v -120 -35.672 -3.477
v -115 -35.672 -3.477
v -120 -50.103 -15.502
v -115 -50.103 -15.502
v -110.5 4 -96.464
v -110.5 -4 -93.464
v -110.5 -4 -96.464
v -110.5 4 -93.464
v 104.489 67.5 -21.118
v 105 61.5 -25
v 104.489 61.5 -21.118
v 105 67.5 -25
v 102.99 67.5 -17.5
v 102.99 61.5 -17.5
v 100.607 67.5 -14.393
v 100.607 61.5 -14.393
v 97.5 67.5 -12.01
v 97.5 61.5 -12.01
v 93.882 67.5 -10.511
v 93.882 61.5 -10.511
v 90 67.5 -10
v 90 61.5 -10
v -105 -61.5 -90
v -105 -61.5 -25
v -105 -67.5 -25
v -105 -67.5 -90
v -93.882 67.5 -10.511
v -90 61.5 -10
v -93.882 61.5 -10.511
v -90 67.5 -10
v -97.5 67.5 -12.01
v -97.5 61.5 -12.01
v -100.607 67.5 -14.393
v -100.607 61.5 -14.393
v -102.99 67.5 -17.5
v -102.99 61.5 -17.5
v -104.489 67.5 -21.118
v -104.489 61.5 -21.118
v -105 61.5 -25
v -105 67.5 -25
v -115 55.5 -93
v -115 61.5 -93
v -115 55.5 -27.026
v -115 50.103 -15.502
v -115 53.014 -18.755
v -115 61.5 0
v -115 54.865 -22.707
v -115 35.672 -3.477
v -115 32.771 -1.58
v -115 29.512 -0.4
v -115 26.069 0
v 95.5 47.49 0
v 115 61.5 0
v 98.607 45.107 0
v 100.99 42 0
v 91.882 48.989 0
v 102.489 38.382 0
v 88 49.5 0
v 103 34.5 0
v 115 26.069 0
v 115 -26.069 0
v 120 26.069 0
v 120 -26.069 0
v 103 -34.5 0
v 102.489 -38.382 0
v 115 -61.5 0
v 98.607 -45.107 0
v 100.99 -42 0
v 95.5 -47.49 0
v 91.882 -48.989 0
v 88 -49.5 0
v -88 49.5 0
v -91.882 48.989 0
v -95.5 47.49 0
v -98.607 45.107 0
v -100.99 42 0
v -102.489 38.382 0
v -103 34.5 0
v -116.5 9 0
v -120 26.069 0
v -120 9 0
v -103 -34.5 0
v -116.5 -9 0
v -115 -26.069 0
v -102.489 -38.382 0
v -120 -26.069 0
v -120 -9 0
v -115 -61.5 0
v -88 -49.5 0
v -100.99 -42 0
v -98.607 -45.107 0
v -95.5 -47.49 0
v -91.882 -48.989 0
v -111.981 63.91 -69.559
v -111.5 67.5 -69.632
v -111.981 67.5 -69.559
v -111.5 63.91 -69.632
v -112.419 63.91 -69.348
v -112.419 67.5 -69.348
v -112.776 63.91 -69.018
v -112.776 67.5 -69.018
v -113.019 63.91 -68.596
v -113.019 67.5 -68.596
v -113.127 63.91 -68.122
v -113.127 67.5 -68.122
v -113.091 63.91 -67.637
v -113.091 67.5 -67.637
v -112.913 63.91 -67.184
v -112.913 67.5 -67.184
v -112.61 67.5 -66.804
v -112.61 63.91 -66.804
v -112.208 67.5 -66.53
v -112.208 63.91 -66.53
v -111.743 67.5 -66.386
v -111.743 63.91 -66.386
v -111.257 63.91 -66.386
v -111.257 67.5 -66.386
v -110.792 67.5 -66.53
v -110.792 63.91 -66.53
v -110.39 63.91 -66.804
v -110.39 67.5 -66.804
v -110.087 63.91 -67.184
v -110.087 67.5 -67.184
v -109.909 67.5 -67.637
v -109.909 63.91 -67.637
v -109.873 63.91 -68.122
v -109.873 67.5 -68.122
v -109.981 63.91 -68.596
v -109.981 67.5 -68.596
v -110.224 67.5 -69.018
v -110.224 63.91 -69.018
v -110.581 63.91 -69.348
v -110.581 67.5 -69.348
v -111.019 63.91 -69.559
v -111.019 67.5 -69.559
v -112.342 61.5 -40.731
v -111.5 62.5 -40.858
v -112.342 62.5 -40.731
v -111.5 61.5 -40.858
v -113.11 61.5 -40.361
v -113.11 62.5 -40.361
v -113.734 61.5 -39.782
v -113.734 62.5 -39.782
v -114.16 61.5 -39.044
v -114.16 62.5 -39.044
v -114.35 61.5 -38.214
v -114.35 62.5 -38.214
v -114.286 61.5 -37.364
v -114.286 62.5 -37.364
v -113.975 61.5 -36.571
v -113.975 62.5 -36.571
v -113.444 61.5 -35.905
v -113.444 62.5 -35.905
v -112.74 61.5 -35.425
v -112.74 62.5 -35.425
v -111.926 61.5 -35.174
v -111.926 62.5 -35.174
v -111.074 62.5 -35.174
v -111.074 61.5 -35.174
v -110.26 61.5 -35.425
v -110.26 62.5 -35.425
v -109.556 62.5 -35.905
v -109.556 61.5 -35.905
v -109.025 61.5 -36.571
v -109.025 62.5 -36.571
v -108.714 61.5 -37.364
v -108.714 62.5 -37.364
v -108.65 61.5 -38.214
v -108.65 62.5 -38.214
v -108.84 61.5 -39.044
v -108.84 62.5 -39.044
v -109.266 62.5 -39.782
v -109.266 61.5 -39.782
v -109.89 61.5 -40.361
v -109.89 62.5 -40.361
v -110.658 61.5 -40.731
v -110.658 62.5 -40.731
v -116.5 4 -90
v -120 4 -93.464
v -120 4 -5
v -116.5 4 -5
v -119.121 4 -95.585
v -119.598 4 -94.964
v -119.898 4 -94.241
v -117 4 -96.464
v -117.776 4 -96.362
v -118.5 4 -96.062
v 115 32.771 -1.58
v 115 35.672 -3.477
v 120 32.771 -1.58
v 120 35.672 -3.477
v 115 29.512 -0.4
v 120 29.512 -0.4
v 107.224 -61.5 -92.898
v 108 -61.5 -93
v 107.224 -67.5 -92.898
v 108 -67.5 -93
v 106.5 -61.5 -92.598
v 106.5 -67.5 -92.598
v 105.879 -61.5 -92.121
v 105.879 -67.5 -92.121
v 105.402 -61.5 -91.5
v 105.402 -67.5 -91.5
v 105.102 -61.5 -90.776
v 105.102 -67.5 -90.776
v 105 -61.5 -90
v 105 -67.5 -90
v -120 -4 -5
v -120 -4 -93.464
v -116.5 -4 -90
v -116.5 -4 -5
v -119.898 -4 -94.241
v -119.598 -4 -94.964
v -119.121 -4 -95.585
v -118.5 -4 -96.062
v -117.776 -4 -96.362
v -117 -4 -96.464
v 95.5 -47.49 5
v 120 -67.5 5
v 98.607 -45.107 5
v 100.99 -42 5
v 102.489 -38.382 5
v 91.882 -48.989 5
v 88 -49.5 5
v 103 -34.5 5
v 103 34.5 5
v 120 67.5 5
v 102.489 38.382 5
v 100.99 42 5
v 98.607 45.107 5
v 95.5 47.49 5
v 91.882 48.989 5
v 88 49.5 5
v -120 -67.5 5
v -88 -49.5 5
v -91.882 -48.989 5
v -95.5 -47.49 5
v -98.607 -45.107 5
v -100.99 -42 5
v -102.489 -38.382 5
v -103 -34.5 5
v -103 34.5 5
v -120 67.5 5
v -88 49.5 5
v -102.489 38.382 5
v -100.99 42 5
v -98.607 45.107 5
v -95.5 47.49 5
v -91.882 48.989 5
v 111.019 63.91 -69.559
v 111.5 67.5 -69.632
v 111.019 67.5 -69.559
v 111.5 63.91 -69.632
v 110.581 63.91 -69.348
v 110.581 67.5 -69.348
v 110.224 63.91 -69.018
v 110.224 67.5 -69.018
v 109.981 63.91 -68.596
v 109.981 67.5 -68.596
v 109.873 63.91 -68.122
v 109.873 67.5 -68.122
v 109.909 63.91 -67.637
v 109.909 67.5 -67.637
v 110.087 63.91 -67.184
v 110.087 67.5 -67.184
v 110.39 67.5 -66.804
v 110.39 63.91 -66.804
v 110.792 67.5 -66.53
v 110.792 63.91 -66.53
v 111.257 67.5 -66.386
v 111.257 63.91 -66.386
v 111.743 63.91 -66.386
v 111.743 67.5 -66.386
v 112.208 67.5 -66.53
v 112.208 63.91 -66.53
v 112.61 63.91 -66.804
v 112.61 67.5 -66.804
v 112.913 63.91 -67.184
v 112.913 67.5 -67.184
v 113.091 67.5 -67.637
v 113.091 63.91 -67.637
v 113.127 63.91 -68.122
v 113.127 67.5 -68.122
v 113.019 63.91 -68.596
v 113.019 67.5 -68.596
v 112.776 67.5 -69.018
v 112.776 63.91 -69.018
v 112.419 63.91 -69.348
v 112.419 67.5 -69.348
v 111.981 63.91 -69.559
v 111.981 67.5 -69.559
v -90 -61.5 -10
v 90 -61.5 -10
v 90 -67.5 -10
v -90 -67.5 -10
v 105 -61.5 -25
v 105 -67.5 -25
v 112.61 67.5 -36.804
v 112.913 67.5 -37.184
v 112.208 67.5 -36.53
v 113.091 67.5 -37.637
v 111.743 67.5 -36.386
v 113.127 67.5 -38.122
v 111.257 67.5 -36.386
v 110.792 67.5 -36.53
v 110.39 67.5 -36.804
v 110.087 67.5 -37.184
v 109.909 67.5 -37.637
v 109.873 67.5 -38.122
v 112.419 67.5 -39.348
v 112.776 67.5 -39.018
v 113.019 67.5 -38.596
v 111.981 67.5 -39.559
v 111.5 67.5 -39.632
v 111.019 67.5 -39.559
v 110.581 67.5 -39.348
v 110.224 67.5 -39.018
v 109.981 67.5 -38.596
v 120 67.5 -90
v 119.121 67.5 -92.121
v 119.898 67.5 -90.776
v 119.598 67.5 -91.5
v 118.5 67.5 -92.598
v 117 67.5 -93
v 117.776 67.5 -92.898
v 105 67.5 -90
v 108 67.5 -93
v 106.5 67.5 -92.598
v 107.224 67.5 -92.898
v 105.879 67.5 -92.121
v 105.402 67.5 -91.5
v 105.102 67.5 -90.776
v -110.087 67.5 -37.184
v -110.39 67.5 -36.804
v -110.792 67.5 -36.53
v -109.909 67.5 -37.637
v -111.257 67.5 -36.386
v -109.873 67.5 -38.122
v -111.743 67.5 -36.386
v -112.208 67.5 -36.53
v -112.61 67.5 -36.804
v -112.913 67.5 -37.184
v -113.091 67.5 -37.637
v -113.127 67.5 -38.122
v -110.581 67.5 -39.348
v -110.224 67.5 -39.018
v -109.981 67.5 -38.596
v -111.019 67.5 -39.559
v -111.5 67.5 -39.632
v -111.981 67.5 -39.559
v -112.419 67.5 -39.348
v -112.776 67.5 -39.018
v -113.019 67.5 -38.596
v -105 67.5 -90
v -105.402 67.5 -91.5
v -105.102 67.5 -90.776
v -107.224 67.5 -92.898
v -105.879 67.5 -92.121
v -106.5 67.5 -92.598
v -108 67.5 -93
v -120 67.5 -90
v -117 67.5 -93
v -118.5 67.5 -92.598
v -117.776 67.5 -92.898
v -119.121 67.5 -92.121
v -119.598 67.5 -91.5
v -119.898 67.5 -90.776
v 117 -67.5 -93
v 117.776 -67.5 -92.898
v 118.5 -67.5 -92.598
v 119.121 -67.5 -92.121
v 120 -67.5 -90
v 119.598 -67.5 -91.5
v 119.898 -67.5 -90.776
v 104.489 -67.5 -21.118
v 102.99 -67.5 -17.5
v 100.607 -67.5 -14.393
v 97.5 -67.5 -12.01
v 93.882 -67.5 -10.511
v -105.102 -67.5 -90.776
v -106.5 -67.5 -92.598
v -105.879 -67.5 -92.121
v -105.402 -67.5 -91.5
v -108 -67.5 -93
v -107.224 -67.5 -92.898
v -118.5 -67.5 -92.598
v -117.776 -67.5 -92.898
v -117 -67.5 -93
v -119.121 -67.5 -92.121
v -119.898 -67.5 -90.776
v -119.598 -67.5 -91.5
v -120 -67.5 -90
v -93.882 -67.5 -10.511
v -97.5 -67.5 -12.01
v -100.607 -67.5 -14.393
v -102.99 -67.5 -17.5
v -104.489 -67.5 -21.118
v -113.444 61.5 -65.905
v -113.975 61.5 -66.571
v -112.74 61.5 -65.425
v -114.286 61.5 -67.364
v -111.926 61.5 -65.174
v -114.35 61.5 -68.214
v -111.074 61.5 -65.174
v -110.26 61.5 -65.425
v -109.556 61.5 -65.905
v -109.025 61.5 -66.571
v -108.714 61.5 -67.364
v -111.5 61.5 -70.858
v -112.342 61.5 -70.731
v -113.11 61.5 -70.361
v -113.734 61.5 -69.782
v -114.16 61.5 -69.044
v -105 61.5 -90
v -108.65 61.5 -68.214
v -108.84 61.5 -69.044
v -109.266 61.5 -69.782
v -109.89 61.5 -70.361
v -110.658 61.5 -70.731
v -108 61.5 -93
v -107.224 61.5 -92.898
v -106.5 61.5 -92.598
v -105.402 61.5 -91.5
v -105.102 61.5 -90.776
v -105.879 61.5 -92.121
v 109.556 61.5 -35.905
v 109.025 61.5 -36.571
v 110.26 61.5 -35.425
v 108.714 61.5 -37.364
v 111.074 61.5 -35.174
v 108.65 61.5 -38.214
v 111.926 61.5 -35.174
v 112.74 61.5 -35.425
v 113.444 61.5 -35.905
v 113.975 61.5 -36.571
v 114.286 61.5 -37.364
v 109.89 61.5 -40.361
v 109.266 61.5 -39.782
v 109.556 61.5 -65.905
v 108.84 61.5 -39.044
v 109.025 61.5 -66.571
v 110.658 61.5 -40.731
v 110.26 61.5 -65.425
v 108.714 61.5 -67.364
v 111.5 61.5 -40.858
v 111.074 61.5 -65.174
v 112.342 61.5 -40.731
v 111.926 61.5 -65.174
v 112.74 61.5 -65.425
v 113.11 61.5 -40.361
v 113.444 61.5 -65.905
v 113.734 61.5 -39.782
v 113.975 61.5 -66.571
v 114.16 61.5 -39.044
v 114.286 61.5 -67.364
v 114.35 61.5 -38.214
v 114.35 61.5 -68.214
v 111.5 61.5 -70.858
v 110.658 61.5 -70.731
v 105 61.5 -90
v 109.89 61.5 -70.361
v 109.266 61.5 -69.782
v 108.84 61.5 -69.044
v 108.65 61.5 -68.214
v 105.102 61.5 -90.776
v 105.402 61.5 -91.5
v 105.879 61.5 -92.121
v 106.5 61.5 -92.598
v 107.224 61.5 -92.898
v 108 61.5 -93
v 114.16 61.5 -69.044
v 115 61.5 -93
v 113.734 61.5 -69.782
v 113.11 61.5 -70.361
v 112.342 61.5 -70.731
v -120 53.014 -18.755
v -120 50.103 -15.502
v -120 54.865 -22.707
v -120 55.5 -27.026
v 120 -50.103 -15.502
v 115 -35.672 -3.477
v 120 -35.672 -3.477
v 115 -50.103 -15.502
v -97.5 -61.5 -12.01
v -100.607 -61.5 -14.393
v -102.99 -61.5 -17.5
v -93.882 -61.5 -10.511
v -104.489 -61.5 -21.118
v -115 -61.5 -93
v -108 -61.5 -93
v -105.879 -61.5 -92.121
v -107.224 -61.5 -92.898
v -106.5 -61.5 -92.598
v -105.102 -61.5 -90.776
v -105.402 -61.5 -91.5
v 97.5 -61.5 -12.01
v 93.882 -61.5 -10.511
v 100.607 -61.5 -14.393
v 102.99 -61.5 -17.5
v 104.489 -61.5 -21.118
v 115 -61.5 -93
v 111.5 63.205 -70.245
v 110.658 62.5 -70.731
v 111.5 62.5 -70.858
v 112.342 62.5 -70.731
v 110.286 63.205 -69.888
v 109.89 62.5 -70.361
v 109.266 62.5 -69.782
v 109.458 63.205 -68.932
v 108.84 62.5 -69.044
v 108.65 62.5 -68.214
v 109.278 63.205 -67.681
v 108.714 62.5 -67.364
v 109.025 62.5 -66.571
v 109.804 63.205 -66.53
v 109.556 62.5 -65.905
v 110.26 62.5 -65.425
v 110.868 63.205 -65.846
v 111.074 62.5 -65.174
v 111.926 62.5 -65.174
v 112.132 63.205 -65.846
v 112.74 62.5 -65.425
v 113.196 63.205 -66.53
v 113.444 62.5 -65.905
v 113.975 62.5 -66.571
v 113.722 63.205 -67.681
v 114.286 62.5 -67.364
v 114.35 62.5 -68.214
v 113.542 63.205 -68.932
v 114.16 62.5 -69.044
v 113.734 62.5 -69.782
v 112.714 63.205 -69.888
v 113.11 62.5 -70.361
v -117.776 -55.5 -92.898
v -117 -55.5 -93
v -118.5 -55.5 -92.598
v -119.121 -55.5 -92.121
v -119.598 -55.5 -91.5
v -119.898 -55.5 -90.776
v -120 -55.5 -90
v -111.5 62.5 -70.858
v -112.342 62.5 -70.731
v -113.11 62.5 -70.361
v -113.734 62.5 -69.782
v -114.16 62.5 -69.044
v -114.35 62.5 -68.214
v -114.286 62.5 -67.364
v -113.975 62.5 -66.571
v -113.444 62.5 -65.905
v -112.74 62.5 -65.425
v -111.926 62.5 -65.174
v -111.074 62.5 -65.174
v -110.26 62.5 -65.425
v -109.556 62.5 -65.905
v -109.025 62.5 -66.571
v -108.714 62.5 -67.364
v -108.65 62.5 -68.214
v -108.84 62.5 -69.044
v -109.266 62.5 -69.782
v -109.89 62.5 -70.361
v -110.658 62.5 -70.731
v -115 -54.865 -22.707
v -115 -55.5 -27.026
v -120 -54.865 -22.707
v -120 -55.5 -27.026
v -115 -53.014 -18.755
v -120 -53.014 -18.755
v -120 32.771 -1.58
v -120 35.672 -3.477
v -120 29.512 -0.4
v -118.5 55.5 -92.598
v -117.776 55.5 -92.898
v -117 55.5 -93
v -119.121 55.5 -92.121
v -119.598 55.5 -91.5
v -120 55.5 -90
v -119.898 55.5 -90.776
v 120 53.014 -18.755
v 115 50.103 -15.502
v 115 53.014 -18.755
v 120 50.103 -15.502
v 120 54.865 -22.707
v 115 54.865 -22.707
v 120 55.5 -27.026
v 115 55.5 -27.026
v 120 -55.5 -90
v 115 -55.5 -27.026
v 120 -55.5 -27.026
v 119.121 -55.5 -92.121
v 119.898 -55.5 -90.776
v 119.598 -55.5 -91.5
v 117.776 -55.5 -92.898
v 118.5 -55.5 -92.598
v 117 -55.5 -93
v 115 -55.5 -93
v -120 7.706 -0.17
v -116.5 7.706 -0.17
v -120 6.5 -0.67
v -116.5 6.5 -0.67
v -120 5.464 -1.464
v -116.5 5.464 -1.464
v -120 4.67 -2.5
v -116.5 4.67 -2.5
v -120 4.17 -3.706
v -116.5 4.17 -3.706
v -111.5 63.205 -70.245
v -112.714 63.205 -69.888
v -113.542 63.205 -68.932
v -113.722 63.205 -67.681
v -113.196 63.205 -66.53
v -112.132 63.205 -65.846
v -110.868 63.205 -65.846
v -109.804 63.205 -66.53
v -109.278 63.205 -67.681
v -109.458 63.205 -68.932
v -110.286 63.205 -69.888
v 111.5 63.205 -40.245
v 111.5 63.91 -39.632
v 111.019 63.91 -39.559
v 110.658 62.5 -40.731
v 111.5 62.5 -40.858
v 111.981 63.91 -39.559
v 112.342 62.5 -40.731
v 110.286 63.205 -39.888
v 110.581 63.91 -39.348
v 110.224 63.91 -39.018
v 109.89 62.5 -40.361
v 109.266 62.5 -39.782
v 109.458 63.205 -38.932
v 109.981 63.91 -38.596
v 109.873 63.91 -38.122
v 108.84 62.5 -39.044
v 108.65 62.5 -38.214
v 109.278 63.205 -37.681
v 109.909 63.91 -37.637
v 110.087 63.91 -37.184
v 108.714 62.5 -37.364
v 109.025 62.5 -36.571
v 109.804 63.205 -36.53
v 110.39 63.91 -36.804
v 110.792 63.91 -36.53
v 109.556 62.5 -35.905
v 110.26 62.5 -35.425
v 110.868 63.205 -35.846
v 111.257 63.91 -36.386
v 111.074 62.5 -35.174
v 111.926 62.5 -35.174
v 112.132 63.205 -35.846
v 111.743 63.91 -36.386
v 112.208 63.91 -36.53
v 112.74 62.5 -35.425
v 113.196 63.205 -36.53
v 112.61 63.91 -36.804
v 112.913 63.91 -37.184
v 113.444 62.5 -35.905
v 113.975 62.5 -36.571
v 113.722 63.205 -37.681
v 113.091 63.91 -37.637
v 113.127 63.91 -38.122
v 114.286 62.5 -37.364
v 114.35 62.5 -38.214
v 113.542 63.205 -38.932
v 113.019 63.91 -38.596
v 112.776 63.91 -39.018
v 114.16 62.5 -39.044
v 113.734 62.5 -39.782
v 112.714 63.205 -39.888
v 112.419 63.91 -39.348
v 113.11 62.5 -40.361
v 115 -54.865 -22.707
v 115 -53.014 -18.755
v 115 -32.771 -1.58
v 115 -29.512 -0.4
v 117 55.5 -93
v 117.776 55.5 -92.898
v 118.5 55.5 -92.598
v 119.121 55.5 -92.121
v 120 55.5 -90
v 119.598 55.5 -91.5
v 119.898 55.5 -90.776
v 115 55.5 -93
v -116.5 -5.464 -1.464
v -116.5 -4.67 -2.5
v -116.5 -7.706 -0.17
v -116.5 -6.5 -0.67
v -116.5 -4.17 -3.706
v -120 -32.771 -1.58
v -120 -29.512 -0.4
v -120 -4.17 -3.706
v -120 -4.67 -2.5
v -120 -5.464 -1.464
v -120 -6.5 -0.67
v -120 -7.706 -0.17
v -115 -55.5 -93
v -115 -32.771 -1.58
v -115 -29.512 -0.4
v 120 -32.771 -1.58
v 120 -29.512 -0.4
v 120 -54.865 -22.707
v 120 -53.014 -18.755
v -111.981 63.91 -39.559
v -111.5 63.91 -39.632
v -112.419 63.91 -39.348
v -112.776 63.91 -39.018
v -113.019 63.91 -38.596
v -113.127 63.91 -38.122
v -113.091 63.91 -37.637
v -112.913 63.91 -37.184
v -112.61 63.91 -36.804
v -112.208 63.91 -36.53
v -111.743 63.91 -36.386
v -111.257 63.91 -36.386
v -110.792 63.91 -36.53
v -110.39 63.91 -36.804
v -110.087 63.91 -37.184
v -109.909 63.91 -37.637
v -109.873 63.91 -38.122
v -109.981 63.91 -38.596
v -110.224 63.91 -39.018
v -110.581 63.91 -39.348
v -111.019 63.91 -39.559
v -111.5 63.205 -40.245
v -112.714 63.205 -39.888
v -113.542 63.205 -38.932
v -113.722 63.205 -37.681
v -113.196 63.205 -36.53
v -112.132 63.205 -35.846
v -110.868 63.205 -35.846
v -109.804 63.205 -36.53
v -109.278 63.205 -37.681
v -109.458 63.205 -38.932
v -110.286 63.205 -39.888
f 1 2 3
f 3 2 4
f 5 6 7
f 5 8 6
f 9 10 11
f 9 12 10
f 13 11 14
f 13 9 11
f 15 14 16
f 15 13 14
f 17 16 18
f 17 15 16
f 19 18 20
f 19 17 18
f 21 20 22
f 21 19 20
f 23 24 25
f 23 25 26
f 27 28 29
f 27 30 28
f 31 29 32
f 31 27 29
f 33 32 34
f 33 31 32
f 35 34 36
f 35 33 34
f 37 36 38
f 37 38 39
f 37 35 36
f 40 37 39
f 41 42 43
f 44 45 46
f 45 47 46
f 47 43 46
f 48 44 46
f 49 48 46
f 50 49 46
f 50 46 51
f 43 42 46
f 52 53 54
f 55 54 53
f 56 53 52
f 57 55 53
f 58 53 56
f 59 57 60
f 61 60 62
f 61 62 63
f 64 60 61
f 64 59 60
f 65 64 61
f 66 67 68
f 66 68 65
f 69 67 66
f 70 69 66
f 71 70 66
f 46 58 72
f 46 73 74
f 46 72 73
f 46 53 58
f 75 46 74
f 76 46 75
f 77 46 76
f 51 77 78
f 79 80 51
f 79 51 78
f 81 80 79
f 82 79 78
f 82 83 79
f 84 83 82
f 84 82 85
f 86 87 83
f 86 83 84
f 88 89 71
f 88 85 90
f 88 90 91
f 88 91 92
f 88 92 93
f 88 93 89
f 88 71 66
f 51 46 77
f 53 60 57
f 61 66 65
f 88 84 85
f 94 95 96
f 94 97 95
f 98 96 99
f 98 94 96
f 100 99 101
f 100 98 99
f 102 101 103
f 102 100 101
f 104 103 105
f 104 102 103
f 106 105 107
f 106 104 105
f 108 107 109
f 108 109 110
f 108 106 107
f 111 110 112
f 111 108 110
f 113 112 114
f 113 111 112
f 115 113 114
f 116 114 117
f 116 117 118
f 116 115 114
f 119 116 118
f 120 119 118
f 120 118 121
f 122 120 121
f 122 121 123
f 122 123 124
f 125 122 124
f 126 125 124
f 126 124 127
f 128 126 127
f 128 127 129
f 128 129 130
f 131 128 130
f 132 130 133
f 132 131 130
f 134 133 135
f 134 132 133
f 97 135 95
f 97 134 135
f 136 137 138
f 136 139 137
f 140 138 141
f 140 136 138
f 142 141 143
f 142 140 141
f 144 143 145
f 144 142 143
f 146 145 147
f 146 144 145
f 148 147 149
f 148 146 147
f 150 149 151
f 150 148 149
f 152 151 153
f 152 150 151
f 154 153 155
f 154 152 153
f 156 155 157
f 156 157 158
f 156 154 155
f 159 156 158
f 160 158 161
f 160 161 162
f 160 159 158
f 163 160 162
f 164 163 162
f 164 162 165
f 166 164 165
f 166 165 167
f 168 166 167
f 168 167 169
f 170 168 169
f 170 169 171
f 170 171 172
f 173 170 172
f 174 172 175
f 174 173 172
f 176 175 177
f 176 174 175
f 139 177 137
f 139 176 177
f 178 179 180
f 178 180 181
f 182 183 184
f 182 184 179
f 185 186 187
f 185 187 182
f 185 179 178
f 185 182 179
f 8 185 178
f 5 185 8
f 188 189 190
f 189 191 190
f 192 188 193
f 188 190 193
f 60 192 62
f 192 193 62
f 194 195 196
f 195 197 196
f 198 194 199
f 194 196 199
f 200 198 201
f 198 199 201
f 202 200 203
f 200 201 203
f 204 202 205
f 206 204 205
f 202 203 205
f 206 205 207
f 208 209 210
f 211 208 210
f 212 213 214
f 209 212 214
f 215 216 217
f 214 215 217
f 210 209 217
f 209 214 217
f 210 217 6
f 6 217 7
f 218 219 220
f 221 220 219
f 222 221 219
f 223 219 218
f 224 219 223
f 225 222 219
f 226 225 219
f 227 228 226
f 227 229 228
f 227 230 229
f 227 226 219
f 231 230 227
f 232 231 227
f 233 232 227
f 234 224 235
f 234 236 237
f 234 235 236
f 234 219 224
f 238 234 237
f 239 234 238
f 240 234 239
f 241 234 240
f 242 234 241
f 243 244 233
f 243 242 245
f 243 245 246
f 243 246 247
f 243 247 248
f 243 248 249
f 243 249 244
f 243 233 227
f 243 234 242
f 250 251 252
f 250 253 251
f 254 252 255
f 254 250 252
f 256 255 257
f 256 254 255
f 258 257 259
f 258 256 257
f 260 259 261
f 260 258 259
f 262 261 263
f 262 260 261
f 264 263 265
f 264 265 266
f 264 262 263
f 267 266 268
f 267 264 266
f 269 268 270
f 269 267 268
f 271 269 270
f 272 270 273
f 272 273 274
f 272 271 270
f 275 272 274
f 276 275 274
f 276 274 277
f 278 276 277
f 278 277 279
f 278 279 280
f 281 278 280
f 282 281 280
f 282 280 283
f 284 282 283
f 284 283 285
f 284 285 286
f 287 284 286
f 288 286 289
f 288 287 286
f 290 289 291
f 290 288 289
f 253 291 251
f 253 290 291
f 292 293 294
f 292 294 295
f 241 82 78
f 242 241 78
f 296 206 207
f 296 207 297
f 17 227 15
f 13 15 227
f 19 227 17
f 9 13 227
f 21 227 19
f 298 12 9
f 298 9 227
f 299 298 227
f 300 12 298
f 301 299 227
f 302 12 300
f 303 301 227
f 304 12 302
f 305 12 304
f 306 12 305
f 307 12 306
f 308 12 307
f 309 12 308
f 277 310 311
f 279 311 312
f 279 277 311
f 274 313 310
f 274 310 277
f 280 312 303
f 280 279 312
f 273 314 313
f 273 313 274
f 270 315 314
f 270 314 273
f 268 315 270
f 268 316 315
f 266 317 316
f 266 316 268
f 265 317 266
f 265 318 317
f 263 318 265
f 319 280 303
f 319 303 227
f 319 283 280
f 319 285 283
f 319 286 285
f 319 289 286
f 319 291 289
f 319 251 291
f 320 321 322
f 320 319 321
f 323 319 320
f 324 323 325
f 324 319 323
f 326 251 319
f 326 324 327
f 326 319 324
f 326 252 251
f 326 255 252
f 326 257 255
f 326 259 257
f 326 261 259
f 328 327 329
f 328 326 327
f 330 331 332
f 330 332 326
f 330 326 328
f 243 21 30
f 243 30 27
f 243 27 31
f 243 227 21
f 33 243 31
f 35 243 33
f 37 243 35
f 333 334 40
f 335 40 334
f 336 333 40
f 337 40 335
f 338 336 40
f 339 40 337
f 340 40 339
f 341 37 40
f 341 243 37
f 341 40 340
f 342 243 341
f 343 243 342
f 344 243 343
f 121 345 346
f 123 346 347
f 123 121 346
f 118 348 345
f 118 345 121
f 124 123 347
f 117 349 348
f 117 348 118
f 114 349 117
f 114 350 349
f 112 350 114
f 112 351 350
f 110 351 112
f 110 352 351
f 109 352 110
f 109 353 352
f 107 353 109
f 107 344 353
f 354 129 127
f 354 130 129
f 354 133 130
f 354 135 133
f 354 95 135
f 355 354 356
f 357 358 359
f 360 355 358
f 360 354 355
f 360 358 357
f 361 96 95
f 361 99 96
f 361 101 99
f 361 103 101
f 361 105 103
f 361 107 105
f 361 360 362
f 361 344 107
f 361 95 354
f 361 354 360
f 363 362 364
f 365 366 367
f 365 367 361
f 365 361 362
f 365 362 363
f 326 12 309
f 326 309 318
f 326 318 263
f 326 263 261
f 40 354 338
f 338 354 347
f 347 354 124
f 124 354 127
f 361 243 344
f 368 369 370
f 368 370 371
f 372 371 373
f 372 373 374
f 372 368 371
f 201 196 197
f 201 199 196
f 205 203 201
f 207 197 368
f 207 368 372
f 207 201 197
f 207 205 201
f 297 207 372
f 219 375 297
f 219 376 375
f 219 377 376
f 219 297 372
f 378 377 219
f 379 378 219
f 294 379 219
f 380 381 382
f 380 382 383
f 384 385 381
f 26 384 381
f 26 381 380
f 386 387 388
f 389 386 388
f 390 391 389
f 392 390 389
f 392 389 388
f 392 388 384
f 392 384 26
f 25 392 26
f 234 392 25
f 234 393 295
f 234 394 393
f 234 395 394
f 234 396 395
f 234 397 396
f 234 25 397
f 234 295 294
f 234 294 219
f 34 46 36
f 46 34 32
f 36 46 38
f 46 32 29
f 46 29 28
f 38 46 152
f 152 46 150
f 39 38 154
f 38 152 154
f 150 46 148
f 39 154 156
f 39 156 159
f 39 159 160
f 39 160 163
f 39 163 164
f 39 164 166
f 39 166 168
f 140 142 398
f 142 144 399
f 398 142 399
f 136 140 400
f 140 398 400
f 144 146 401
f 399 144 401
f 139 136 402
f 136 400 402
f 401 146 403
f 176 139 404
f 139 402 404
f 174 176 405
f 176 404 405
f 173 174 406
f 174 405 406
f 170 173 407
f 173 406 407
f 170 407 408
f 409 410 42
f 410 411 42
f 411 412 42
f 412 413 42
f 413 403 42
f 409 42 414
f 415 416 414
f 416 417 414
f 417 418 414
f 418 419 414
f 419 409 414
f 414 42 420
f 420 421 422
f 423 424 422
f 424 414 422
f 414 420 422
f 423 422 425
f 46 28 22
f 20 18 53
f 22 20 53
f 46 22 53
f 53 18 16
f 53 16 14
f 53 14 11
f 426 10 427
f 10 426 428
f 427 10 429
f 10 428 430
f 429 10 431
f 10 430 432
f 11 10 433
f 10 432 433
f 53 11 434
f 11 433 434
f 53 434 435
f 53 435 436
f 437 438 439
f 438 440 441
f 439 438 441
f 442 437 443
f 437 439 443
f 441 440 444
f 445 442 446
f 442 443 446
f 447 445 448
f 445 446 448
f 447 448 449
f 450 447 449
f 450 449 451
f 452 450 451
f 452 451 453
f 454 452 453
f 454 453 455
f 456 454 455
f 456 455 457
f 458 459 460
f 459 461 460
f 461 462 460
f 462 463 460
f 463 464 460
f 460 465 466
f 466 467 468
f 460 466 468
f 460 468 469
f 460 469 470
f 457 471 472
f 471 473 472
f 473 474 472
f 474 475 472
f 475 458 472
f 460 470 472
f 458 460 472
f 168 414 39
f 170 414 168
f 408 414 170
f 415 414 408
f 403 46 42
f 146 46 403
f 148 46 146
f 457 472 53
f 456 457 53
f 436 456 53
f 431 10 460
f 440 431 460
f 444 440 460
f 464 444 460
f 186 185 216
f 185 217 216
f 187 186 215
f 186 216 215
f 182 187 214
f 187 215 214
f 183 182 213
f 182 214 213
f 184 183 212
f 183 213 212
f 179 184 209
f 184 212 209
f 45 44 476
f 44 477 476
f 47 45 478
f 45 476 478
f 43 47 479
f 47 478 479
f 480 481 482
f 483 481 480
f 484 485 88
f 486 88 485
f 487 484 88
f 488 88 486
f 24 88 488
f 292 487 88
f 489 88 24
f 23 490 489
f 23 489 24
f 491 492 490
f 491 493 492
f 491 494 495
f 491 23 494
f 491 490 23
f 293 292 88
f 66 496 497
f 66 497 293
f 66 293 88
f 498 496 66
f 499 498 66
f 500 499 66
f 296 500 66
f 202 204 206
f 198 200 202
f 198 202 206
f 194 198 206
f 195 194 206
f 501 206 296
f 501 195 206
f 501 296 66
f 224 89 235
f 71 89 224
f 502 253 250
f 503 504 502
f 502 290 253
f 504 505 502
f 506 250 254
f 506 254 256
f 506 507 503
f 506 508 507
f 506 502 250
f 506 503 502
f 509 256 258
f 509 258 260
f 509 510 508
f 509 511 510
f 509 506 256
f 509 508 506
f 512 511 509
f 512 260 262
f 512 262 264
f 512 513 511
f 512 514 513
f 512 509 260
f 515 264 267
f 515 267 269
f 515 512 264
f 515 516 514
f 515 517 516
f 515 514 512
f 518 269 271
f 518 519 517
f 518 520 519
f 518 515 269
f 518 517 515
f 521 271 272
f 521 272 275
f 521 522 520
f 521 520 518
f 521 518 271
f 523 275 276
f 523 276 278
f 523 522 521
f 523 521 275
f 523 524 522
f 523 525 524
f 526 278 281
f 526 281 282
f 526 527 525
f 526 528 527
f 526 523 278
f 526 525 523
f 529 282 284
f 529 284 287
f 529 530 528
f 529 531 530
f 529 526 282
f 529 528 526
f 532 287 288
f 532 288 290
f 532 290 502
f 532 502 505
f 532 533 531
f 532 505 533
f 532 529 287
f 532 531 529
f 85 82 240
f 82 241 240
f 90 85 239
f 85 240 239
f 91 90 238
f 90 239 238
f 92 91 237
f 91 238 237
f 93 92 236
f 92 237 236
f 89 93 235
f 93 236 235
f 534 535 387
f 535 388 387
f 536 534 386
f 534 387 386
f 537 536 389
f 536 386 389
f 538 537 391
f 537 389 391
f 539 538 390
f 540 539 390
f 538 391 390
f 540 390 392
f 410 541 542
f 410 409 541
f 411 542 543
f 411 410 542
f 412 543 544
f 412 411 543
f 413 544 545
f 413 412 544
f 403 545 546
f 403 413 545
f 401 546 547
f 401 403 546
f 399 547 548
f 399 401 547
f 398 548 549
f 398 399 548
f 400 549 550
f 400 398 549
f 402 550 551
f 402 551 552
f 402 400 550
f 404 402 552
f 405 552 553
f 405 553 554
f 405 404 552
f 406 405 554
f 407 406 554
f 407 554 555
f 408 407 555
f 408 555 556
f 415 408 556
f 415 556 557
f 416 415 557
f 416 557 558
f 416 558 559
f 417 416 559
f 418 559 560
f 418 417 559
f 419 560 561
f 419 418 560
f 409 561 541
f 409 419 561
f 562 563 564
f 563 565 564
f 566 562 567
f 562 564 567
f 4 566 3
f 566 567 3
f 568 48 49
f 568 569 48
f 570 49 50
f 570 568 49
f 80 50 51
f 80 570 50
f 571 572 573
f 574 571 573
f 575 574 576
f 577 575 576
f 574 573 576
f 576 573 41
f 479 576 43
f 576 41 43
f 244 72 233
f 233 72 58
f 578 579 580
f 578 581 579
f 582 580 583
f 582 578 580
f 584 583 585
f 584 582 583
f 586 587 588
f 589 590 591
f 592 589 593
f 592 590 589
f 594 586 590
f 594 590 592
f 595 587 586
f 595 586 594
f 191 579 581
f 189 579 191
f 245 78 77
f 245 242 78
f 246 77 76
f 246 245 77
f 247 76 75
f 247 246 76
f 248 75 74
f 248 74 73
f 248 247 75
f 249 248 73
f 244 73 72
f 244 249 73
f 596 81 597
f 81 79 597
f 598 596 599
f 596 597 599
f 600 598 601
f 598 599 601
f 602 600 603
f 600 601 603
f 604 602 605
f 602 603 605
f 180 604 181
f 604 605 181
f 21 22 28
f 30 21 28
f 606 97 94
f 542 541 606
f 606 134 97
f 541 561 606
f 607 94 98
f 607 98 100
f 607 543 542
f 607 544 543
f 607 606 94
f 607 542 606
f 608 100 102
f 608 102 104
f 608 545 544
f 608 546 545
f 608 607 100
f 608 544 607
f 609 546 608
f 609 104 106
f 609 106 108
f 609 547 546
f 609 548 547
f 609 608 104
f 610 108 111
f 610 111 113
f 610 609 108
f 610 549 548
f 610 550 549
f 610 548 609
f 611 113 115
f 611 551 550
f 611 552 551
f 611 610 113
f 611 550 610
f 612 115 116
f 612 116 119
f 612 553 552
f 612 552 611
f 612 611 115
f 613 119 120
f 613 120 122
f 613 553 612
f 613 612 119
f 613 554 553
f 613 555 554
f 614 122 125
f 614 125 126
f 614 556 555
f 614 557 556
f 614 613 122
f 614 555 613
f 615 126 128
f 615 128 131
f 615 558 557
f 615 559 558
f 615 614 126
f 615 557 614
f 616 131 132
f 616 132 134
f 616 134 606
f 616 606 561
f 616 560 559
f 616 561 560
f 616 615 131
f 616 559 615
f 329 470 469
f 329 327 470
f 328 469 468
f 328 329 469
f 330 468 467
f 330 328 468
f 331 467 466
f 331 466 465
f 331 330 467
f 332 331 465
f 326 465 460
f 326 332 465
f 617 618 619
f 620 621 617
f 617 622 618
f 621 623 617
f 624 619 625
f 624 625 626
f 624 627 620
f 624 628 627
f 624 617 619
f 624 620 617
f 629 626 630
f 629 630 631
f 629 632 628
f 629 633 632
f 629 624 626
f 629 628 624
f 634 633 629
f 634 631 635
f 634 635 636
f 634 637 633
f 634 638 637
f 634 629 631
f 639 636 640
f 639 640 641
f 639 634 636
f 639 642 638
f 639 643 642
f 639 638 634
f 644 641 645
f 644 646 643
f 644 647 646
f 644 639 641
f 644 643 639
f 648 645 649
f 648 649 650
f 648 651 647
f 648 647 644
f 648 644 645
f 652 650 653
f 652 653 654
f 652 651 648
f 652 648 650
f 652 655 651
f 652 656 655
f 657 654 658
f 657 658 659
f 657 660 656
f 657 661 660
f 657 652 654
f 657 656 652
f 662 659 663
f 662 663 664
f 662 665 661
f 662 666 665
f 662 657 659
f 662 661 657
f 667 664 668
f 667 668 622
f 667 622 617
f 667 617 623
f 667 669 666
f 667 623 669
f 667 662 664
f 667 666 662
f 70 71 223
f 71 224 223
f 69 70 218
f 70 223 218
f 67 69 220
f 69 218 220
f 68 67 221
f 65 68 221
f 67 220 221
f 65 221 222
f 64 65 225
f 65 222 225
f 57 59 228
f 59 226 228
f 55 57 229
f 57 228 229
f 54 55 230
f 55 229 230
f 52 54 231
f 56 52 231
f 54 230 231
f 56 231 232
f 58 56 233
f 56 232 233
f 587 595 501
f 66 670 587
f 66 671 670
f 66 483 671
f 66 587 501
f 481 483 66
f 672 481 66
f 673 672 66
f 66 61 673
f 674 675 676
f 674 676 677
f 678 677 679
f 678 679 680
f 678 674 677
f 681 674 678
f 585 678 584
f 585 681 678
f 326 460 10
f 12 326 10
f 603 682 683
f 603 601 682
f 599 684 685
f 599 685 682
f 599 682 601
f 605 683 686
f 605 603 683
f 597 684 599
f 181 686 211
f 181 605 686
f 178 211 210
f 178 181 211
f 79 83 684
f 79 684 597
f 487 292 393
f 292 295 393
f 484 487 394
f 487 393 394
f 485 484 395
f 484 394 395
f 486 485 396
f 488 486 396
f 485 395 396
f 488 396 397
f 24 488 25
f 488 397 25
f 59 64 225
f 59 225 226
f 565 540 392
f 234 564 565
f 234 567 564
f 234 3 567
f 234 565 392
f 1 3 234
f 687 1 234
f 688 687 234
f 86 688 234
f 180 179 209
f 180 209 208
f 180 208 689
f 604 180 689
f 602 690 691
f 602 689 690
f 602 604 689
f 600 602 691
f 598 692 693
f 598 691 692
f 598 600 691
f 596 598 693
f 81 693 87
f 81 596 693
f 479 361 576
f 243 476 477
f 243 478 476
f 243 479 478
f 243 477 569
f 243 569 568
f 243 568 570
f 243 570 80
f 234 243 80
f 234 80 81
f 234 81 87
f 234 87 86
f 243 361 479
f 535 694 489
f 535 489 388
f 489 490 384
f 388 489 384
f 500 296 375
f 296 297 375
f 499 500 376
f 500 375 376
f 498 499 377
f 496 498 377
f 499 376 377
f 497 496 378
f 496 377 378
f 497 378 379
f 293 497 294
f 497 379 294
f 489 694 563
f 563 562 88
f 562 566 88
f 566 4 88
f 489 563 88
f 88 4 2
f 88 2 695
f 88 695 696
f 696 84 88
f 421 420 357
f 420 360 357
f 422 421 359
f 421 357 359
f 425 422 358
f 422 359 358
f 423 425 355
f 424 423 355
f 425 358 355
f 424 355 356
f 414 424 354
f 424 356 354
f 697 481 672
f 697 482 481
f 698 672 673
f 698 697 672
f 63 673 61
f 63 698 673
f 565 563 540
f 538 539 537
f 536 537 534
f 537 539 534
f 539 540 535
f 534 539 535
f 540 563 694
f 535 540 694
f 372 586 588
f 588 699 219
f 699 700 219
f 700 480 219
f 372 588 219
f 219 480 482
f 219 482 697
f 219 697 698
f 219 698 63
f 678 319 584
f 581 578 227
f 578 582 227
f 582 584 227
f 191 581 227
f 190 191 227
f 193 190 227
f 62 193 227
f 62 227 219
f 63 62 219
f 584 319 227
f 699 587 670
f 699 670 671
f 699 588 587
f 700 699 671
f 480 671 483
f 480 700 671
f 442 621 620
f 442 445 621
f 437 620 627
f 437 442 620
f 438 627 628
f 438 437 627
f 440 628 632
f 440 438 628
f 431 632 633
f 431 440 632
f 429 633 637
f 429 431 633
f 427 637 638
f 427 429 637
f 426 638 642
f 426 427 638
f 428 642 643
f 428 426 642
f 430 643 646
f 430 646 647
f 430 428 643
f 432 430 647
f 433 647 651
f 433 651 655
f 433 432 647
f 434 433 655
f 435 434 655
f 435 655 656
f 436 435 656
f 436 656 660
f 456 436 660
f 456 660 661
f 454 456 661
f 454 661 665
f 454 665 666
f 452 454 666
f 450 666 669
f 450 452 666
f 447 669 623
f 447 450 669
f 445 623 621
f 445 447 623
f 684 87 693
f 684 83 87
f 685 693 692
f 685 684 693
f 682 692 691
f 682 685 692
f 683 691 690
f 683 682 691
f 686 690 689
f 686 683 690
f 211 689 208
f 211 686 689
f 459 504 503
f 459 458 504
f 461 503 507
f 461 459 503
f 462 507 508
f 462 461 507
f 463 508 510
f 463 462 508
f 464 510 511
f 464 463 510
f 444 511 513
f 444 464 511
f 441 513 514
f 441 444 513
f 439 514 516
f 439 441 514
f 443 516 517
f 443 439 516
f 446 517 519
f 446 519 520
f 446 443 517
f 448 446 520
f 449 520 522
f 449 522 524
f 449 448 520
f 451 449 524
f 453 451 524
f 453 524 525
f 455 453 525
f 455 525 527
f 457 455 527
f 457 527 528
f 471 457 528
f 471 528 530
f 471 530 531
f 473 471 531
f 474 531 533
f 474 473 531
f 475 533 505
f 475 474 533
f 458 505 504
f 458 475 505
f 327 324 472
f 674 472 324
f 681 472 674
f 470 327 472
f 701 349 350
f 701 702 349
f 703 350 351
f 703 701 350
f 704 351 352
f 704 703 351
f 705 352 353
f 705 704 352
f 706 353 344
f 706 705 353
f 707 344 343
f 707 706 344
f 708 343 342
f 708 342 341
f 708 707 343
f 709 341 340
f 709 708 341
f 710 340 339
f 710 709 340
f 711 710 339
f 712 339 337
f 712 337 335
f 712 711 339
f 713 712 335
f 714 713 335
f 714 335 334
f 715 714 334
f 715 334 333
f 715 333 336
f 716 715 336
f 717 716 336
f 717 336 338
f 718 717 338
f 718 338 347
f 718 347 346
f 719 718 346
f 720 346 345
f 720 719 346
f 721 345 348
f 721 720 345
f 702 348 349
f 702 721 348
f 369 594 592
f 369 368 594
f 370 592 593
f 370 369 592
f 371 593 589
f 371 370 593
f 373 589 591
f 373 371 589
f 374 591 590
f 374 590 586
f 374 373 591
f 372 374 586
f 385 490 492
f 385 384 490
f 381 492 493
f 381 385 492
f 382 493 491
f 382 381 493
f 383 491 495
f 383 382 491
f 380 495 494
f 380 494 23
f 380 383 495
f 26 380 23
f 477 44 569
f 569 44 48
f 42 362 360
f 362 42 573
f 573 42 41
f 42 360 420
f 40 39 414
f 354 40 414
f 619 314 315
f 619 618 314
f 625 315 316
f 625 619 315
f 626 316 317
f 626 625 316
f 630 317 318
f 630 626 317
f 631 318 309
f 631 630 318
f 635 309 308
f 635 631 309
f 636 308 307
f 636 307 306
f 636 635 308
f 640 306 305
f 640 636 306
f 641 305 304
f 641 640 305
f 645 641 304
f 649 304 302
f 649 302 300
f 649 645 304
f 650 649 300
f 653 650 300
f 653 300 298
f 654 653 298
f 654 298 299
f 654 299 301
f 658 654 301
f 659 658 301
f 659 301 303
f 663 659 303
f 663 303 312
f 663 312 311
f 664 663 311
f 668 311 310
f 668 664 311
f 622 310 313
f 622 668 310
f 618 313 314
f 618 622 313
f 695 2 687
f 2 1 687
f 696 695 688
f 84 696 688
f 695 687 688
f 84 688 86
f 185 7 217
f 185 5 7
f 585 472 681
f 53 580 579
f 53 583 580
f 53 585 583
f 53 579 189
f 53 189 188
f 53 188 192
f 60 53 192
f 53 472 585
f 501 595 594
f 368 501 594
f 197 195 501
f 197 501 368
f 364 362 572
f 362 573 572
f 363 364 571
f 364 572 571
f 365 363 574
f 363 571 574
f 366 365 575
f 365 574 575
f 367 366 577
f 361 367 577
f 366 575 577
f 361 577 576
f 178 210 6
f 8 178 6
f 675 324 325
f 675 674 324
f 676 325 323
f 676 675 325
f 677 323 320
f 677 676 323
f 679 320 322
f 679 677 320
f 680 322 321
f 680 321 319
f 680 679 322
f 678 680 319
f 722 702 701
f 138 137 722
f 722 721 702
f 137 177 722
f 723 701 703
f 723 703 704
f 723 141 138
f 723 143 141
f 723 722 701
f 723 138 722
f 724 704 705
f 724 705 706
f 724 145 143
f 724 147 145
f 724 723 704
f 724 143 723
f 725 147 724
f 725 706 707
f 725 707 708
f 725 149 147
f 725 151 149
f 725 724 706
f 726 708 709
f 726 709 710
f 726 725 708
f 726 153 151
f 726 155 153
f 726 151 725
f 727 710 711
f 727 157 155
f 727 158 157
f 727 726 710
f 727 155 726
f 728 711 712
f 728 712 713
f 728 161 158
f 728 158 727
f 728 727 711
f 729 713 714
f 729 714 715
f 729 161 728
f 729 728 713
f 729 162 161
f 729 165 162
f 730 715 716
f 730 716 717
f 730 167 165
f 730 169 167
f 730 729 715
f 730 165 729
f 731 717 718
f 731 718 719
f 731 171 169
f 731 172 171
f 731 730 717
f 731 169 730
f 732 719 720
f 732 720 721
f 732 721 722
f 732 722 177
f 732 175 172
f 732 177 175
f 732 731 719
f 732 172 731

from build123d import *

# Parameters (mm, degrees)
SKETCH1_W                                     = 230
SKETCH1_H                                     = 123
SKETCH1_W_2                                   = 206
SKETCH1_H_2                                   = 99
BOSS_EXTRUDE1_DEPTH                           = 5
SKETCH2_W                                     = 230
SKETCH2_H                                     = 5
BOSS_EXTRUDE2_DEPTH                           = 6
BOSS_EXTRUDE3_DEPTH                           = 5
FILLET1_R                                     = 15
BOSS_EXTRUDE4_DEPTH                           = 4
FILLET2_R                                     = 5
FILLET3_R                                     = 3
CSK_FOR_4_FLAT_HEAD_MACHINE_SCREW1_AT_2_COUNT = 2
CSK_FOR_4_FLAT_HEAD_MACHINE_SCREW1_AT_2_PITCH = 30
CSK_FOR_4_FLAT_HEAD_MACHINE_SCREW1_AT_3_COUNT = 2
CSK_FOR_4_FLAT_HEAD_MACHINE_SCREW1_AT_3_PITCH = 225.008888713
CSK_FOR_4_FLAT_HEAD_MACHINE_SCREW1_AT_4_COUNT = 2
CSK_FOR_4_FLAT_HEAD_MACHINE_SCREW1_AT_4_PITCH = 223


with BuildPart() as part:
    # Sketch1 → Boss-Extrude1 (new body)
    with BuildSketch(Plane.XY):
        Rectangle(SKETCH1_W, SKETCH1_H)
        Rectangle(SKETCH1_W_2, SKETCH1_H_2, mode=Mode.SUBTRACT)
    extrude(amount=BOSS_EXTRUDE1_DEPTH)

    # Sketch2 → Boss-Extrude2 (add)
    with BuildSketch(Plane(origin=(0, 61.5, 0), x_dir=(1, 0, 0), z_dir=(0, 1, 0))):
        Polygon((-115, 10), (-115, 0), (115, 0), (115, 10), (115, 93), (105, 93), (105, 10), (-105, 10), (-105, 93), (-115, 93), align=None)
        with Locations((0, -2.5)):
            Rectangle(SKETCH2_W, SKETCH2_H)
    boss_extrude2 = extrude(amount=BOSS_EXTRUDE2_DEPTH)

    # Mirror1: Boss-Extrude2 across plane
    add(boss_extrude2.mirror(Plane.ZX))

    # Sketch3 → Boss-Extrude3 (add)
    with BuildSketch(Plane.ZY.offset(115)):
        Polygon((-93, 61.5), (0, 61.5), (0, -61.5), (-93, -61.5), (-93, -67.5), (5, -67.5), (5, 67.5), (-93, 67.5), align=None)
        Polygon((0, 61.5), (-25, 61.5), (-20, 55.5), (0, 31.5), align=None)
        Polygon((0, -61.5), (0, -31.5), (-20, -55.5), (-25, -61.5), align=None)
        Polygon((-20, 55.5), (-25, 61.5), (-93, 61.5), (-93, 55.5), align=None)
        Polygon((-25, -61.5), (-20, -55.5), (-93, -55.5), (-93, -61.5), align=None)
    boss_extrude3 = extrude(amount=BOSS_EXTRUDE3_DEPTH)

    # Mirror2: Boss-Extrude3 across plane
    add(boss_extrude3.mirror(Plane(origin=(0, 0, 0), x_dir=(0, 0, 1), z_dir=(1, 0, 0))))

    # Fillet1
    fillet1_edges = [part.edges().sort_by_distance(p)[0] for p in [
        (117.5, 55.5, -20),
        (117.5, -55.5, -20),
        (117.5, -31.5, 0),
        (117.5, 31.5, 0),
        (-103, -49.5, 2.5),
        (103, -49.5, 2.5),
        (103, 49.5, 2.5),
        (-103, 49.5, 2.5),
        (105, 64.5, -10),
        (-105, 64.5, -10),
        (-105, -64.5, -10),
        (105, -64.5, -10),
        (-117.5, 55.5, -20),
        (-117.5, 31.5, 0),
        (-117.5, -31.5, 0),
        (-117.5, -55.5, -20),
    ]]
    fillet(fillet1_edges, radius=FILLET1_R)

    # Sketch4 → Boss-Extrude4 (add, symmetric)
    with BuildSketch(Plane(origin=(0, 0, 0), x_dir=(1, 0, 0), z_dir=(0, 1, 0))):
        Polygon((-120, 96.464101615), (-120, 0), (-116.5, 0), (-116.5, 90), (-110.5, 93.464101615), (-110.5, 96.464101615), align=None)
    extrude(amount=BOSS_EXTRUDE4_DEPTH, both=True)

    # Fillet2
    fillet2_edges = [part.edges().sort_by_distance(p)[0] for p in [
        (-118.25, 4, 0),
        (-118.25, -4, 0),
    ]]
    fillet(fillet2_edges, radius=FILLET2_R)

    # Fillet3
    fillet3_edges = [part.edges().sort_by_distance(p)[0] for p in [
        (120, 61.5, -93),
        (120, -61.5, -93),
        (105, 64.5, -93),
        (-120, 0, -96.464101615),
        (-105, 64.5, -93),
        (-105, -64.5, -93),
        (105, -64.5, -93),
        (-120, -61.5, -93),
        (-120, 61.5, -93),
    ]]
    fillet(fillet3_edges, radius=FILLET3_R)

    # Sketch6 → CSK for #4 Flat Head Machine Screw1 (revolve, cut)
    with BuildSketch(Plane(origin=(111.5, 61.5, -68), x_dir=(0, 0, -1), z_dir=(1, 0, 0))):
        Polygon((0, 0), (0, 6), (1.63195, 6), (1.63195, 2.409835609), (2.857501397, 1), (2.857501397, 0), align=None)
    csk_for_4_flat_head_machine_screw1 = revolve(axis=Axis((111.5, 55.15, -68), (0, 1, 0)), mode=Mode.SUBTRACT)

    # CSK for #4 Flat Head Machine Screw1 at 2: CSK for #4 Flat Head Machine Screw1 ×2
    with Locations(*[(0, 0, i * CSK_FOR_4_FLAT_HEAD_MACHINE_SCREW1_AT_2_PITCH) for i in range(1, CSK_FOR_4_FLAT_HEAD_MACHINE_SCREW1_AT_2_COUNT)]):
        add(csk_for_4_flat_head_machine_screw1, mode=Mode.SUBTRACT)

    # CSK for #4 Flat Head Machine Screw1 at 3: CSK for #4 Flat Head Machine Screw1 ×2
    with Locations(*[Vector(-0.991071958, 0, 0.133328066) * (i * CSK_FOR_4_FLAT_HEAD_MACHINE_SCREW1_AT_3_PITCH) for i in range(1, CSK_FOR_4_FLAT_HEAD_MACHINE_SCREW1_AT_3_COUNT)]):
        add(csk_for_4_flat_head_machine_screw1, mode=Mode.SUBTRACT)

    # CSK for #4 Flat Head Machine Screw1 at 4: CSK for #4 Flat Head Machine Screw1 ×2
    with Locations(*[(-i * CSK_FOR_4_FLAT_HEAD_MACHINE_SCREW1_AT_4_PITCH, 0, 0) for i in range(1, CSK_FOR_4_FLAT_HEAD_MACHINE_SCREW1_AT_4_COUNT)]):
        add(csk_for_4_flat_head_machine_screw1, mode=Mode.SUBTRACT)


solid = part.part
